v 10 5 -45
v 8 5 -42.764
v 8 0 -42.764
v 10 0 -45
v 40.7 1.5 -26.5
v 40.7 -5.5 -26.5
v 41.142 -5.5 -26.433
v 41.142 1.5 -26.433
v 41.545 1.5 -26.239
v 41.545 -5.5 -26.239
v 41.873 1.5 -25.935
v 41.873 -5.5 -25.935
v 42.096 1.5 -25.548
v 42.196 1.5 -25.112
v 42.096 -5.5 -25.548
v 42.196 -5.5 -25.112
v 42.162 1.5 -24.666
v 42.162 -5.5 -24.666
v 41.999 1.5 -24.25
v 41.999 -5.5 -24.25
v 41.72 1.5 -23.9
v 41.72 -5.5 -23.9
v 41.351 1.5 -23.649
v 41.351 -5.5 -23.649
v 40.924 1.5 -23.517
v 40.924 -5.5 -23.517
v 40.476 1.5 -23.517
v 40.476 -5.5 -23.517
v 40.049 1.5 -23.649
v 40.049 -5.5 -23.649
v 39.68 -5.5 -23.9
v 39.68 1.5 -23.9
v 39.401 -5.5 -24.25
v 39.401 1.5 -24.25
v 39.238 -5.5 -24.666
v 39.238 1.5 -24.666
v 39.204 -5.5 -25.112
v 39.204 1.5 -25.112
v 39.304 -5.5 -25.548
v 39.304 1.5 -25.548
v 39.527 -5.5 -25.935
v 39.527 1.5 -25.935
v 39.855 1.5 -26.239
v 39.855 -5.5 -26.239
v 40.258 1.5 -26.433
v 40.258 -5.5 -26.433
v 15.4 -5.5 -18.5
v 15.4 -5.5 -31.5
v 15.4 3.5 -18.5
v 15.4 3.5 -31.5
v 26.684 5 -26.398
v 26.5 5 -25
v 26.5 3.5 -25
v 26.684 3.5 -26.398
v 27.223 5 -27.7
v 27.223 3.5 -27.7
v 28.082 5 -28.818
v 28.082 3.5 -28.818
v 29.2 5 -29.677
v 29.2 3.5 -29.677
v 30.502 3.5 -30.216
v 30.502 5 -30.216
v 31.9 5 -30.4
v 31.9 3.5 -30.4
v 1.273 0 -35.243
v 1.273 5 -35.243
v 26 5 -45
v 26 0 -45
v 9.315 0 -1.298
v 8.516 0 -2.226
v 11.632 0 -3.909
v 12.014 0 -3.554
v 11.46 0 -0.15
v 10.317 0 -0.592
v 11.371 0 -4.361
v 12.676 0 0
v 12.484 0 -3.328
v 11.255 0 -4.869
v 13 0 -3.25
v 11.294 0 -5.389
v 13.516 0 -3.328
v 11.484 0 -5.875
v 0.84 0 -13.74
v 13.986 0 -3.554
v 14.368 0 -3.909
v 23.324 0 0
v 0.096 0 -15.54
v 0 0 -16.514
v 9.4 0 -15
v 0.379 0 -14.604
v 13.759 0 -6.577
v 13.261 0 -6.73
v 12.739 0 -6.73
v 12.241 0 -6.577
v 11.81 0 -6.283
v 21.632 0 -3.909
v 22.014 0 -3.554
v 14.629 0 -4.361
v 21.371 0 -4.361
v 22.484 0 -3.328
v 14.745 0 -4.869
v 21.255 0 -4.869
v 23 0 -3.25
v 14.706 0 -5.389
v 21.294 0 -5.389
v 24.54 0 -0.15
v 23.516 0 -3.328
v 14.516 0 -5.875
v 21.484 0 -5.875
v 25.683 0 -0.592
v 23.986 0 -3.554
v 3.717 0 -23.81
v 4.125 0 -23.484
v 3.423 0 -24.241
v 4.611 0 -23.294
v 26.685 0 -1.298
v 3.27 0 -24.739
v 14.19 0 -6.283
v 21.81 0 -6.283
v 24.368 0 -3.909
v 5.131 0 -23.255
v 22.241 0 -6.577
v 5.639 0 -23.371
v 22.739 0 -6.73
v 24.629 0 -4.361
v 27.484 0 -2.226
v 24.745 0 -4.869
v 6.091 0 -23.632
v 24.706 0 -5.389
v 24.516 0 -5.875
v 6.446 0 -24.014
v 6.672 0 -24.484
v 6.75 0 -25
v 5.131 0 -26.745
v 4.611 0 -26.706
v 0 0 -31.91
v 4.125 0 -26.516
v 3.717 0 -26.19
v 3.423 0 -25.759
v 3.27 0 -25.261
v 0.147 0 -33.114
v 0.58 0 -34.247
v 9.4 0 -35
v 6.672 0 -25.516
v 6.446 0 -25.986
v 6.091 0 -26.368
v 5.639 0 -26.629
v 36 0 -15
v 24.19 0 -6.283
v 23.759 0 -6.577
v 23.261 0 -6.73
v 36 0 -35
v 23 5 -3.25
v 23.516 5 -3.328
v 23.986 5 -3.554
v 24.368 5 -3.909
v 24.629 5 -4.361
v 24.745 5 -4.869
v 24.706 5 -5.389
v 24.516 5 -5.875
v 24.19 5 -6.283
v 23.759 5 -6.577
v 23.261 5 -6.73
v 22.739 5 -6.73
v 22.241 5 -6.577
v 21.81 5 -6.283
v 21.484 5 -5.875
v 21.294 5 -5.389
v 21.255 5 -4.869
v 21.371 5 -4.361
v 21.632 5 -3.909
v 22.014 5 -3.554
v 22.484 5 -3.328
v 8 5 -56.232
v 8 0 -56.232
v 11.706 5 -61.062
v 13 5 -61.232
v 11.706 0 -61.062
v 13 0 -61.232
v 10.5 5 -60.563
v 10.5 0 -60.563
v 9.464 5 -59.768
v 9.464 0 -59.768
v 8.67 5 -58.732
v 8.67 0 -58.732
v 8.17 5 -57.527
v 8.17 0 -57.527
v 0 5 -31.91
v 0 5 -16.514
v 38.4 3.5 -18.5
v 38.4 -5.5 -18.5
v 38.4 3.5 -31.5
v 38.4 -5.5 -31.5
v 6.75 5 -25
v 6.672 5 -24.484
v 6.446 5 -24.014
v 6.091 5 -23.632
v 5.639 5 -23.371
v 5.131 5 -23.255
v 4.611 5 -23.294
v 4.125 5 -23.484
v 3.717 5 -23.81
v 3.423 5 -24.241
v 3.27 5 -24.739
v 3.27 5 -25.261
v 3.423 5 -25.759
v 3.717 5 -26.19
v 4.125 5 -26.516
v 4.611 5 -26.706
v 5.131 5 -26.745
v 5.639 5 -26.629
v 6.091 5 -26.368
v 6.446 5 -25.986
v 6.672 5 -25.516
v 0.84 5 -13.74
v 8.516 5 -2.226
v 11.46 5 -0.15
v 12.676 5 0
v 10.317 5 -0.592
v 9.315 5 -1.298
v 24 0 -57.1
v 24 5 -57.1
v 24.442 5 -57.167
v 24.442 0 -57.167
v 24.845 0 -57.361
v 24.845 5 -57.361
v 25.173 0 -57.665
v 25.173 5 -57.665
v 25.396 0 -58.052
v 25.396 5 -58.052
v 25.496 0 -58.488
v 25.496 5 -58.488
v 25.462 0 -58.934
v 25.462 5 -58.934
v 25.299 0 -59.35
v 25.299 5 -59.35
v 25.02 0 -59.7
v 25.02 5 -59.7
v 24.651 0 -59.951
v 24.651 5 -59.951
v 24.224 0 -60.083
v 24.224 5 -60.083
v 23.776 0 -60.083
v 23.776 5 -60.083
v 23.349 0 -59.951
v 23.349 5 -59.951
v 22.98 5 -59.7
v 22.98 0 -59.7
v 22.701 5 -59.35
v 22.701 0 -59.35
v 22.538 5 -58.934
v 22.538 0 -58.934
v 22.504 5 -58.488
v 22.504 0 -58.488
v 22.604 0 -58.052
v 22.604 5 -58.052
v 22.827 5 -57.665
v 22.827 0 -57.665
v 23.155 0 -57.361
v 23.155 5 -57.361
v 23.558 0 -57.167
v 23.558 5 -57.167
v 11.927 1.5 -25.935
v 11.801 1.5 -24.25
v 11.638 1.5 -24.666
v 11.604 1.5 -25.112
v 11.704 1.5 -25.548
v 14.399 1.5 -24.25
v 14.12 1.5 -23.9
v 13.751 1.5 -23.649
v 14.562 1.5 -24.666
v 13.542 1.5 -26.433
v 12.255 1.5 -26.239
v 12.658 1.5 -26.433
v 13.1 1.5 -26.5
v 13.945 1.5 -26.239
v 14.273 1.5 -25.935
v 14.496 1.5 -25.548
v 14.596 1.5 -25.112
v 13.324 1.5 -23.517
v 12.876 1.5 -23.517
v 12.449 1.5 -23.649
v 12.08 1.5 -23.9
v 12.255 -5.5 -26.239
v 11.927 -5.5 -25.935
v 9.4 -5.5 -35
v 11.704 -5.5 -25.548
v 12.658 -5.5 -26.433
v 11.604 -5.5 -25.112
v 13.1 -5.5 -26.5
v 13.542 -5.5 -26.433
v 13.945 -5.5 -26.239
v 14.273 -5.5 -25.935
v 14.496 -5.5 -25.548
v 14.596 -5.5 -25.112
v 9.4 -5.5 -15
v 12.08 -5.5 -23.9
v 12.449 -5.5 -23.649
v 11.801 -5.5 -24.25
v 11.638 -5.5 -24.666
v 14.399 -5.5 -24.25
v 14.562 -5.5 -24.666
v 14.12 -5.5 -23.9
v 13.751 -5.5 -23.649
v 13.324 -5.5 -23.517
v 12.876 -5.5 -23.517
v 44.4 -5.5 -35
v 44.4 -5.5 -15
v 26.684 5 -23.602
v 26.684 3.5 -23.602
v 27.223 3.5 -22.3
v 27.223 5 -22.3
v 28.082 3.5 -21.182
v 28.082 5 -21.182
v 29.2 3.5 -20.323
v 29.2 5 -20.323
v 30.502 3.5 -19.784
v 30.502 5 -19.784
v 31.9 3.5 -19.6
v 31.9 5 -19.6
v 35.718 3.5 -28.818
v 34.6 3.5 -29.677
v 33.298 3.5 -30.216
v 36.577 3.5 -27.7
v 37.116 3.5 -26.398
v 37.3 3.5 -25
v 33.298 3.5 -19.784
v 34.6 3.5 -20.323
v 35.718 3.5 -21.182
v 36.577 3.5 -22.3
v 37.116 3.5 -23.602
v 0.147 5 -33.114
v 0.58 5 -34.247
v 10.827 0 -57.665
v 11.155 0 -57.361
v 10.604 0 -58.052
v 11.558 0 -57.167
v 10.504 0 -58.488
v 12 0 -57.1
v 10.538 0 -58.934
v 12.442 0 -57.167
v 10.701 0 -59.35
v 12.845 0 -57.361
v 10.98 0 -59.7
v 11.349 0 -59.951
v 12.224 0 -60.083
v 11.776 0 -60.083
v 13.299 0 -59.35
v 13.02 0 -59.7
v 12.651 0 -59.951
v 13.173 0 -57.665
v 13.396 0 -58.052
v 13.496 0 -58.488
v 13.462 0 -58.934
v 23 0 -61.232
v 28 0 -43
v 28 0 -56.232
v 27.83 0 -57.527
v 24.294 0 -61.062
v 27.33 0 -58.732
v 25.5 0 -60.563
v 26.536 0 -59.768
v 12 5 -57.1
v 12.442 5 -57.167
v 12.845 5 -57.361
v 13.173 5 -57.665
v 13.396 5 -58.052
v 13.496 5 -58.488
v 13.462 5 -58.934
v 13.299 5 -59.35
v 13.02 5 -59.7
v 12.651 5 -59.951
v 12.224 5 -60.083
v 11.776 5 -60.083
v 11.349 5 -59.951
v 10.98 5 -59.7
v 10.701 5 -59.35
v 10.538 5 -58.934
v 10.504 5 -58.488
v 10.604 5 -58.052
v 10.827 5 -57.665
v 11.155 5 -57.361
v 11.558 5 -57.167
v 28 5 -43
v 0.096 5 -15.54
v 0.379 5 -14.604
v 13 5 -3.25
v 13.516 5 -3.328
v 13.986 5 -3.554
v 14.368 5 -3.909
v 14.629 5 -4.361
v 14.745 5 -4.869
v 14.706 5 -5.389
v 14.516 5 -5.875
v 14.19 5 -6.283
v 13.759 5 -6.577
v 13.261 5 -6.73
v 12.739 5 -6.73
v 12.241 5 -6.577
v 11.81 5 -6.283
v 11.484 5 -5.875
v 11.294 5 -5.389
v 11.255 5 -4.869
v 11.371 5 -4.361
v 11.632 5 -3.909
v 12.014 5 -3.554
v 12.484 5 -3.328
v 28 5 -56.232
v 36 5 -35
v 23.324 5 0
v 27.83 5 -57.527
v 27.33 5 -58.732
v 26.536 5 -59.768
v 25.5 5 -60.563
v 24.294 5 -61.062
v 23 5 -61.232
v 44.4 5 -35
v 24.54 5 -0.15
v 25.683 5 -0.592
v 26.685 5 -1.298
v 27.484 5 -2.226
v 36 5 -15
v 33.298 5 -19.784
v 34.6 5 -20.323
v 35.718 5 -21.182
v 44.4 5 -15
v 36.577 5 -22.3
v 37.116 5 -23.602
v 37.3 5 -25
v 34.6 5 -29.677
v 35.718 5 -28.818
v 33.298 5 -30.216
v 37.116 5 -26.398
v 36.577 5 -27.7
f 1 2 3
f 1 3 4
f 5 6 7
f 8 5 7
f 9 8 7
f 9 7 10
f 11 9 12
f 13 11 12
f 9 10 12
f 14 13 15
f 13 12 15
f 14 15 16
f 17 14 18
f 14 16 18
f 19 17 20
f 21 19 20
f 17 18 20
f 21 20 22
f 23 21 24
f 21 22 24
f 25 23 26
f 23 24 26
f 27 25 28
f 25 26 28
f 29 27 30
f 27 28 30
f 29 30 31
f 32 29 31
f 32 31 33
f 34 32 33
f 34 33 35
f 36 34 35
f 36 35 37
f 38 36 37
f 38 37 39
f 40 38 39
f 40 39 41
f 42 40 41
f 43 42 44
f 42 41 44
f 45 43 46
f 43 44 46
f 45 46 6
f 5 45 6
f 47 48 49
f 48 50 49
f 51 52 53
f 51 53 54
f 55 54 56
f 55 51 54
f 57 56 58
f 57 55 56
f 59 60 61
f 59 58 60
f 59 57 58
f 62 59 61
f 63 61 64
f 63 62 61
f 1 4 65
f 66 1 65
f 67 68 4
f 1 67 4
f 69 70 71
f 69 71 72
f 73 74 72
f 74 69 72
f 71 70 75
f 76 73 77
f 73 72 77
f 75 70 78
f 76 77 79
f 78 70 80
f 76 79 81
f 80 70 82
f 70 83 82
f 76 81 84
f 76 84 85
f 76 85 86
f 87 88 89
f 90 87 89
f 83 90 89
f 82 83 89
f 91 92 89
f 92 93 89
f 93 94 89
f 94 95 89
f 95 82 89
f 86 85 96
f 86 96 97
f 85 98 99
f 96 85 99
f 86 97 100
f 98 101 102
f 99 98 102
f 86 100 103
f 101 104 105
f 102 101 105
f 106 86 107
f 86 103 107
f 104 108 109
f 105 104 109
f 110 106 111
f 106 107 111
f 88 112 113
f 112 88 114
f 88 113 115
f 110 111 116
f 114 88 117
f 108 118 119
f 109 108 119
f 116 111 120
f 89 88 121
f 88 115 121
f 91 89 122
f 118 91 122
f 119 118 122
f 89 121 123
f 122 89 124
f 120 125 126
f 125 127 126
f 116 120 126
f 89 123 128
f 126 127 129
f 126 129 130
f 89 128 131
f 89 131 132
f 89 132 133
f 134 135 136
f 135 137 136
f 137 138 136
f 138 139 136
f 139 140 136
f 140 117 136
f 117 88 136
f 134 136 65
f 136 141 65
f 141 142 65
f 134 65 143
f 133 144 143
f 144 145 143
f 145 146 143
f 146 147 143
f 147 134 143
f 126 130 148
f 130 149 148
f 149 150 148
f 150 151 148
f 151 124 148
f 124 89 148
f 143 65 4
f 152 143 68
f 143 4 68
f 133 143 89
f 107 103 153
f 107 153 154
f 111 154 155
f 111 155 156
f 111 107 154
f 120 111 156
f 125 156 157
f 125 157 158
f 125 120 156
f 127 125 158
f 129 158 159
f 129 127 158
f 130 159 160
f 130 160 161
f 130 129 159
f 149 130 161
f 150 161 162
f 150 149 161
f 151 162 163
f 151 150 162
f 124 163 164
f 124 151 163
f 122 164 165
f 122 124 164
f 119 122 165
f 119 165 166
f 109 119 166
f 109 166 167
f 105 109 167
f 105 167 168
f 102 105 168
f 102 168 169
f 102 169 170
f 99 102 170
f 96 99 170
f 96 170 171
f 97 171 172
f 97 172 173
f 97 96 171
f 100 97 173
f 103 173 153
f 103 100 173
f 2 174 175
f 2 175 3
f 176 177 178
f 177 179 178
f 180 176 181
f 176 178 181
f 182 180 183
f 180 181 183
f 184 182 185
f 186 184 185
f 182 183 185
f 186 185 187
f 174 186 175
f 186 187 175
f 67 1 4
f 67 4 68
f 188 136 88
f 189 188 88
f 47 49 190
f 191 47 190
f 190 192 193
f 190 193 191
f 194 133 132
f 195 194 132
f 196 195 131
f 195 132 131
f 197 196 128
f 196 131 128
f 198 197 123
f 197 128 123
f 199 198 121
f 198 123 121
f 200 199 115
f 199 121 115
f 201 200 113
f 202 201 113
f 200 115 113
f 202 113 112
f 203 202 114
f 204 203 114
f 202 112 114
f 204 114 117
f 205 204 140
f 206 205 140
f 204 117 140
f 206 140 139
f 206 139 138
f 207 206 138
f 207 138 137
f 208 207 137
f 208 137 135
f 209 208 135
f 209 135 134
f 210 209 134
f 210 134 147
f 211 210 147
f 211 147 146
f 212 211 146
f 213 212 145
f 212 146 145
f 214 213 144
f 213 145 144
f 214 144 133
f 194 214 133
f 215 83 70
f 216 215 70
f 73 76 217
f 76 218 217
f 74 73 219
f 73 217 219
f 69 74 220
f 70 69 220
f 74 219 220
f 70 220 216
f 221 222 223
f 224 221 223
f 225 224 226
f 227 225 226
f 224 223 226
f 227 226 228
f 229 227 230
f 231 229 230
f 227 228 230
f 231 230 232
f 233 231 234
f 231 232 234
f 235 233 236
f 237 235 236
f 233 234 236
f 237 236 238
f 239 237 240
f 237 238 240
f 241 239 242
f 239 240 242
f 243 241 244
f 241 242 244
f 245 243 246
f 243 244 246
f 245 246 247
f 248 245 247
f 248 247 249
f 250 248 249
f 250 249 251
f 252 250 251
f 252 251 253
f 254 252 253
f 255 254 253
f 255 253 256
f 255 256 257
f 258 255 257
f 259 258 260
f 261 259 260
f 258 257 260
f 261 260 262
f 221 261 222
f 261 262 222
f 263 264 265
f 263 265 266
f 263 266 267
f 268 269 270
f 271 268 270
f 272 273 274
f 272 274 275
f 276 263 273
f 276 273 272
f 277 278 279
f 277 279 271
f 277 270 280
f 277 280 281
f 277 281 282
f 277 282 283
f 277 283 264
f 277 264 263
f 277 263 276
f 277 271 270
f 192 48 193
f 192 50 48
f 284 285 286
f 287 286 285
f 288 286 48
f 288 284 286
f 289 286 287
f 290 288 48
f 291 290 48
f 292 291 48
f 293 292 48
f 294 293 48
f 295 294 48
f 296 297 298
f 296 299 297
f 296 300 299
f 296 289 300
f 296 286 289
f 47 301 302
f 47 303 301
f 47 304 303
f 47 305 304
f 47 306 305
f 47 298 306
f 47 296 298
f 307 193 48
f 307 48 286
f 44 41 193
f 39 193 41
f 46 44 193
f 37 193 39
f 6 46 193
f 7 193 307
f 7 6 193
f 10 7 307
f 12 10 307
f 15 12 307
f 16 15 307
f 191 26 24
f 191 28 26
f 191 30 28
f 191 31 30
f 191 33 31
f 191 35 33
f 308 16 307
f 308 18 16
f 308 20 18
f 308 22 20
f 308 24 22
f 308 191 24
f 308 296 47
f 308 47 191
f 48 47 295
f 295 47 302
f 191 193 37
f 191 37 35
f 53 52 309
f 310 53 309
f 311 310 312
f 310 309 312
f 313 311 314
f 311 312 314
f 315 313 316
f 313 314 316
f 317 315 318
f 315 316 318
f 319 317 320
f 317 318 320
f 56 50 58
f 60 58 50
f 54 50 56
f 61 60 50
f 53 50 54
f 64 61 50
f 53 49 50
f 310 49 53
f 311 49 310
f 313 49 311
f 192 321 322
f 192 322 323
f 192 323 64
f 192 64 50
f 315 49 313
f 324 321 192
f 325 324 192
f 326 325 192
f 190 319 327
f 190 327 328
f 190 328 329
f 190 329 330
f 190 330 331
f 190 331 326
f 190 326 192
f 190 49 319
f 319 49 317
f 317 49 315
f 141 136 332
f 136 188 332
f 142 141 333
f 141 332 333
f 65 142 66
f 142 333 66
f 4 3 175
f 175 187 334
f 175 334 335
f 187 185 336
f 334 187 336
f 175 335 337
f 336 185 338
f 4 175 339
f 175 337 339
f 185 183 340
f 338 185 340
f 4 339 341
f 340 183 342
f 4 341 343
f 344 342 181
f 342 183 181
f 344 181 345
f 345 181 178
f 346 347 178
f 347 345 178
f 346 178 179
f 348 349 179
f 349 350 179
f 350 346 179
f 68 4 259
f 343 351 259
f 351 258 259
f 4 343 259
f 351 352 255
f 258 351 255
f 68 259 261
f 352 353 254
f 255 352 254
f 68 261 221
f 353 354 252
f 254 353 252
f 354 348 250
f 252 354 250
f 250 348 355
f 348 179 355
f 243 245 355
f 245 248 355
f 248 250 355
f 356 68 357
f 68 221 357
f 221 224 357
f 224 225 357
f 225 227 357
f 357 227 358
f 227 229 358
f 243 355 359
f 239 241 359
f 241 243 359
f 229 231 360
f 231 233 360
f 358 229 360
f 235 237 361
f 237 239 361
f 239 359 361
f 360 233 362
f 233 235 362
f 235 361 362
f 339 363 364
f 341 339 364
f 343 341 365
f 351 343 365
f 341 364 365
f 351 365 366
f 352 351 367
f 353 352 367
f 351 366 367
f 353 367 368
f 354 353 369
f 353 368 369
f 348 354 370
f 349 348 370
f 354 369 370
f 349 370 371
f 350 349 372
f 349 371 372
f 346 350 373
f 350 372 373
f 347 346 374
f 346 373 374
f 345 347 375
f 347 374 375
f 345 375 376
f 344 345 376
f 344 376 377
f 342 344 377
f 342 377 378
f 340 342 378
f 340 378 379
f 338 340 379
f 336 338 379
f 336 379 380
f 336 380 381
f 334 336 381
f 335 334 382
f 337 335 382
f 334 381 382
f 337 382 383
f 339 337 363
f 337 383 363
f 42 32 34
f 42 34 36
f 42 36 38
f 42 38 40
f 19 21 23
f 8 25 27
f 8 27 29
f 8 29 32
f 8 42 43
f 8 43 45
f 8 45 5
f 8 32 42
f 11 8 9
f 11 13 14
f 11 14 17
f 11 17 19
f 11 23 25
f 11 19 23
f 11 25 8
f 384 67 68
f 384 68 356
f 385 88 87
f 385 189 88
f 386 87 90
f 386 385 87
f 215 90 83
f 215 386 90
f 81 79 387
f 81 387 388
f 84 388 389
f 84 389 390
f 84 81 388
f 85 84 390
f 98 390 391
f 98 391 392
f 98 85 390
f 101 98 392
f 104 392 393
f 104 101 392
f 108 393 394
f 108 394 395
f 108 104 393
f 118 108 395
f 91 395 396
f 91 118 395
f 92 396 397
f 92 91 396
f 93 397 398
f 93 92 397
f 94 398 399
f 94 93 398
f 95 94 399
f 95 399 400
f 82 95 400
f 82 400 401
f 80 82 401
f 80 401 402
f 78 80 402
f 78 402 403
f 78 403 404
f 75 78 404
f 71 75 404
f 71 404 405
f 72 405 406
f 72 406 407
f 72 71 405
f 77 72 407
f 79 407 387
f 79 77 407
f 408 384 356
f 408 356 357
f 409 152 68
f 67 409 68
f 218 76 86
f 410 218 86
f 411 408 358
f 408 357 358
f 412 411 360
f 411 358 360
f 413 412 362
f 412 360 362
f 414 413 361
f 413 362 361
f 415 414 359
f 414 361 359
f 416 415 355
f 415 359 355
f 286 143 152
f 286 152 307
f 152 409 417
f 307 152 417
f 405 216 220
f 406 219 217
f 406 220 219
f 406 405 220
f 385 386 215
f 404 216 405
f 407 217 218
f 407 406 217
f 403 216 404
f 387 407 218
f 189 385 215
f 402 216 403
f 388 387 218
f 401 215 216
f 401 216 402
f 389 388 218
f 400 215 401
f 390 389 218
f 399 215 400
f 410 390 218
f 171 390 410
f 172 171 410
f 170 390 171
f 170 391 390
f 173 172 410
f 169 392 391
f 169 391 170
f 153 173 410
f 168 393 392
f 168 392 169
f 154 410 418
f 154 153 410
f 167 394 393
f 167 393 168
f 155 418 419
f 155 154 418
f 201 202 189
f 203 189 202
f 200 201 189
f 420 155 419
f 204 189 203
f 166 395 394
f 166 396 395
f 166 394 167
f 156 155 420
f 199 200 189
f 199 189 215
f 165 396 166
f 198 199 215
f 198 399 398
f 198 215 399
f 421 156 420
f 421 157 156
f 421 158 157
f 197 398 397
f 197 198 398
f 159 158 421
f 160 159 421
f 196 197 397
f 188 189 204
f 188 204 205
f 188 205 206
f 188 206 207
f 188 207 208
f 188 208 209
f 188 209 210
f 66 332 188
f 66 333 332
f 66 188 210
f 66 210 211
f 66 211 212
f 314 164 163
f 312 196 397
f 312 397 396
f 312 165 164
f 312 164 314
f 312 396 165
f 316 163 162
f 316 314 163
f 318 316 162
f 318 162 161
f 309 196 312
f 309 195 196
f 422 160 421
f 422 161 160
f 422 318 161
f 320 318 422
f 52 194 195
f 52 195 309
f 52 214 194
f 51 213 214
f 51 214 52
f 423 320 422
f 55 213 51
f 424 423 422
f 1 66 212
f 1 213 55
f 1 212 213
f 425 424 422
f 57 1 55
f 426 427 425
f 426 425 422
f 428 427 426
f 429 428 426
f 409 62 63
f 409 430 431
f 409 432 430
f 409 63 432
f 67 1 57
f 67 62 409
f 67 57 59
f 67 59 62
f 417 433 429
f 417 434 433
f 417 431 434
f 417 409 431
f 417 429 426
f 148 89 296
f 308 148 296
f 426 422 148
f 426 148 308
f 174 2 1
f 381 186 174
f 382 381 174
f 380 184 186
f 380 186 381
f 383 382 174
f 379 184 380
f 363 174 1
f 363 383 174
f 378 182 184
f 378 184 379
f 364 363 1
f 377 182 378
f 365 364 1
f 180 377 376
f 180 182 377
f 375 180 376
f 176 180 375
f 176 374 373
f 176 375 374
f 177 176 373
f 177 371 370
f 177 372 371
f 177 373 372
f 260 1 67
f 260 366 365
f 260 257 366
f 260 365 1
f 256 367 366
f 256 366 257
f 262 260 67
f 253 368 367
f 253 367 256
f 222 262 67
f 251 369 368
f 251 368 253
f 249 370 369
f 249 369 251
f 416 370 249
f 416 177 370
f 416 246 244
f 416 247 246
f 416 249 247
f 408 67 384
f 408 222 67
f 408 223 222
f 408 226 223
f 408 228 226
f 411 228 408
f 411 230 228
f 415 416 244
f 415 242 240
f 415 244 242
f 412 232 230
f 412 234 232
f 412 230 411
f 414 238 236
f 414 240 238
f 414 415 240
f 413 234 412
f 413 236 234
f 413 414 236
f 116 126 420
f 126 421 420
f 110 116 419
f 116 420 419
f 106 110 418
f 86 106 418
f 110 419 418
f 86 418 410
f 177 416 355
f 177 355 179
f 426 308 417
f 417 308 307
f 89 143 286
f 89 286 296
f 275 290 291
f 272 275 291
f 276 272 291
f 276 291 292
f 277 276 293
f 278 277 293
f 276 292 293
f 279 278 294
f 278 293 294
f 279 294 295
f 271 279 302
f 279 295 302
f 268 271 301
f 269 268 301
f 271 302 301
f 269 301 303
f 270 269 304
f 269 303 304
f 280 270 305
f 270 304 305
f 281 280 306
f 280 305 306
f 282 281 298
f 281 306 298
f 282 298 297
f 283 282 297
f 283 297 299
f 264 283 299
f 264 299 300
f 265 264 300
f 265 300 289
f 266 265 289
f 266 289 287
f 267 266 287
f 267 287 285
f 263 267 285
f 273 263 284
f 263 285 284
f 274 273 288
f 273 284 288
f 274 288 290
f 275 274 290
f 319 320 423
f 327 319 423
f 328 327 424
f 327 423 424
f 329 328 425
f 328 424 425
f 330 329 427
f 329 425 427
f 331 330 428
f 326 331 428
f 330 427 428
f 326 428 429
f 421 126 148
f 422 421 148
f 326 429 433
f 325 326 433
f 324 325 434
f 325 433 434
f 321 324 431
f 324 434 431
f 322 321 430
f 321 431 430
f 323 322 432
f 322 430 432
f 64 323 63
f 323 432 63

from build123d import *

# Parameters (mm, degrees)
SKETCH1_R           = 1.75
SKETCH1_W           = 7.2
SKETCH1_H           = 5.4
BOSS_EXTRUDE1_DEPTH = 5
FILLET5_RADIUS      = 10
FILLET5_LENGTH      = 5
FILLET2_R           = 5.4
FILLET6_R           = 5.4
SKETCH3_W           = 35
SKETCH3_H           = 20
SKETCH3_W_2         = 23
SKETCH3_H_2         = 13
BOSS_EXTRUDE4_DEPTH = 5.5
SKETCH5_W           = 23
SKETCH5_H           = 13
CUT_EXTRUDE1_DEPTH  = 3.5
CUT_EXTRUDE2_DEPTH  = 76.201396264
SKETCH9_R           = 1.5
CUT_EXTRUDE4_DEPTH  = 7
ESQUISSE4_R         = 1.5
BOSS_EXTRU_1_DEPTH  = 5
CONG_1_R            = 5
CONG_2_R            = 5


with BuildPart() as part:
    # Sketch1 → Boss-Extrude1 (new body)
    # profile 1 of 4: a face of its own
    with BuildSketch(Plane(origin=(0, 0, 0), x_dir=(1, 0, 0), z_dir=(0, 1, 0))):
        with BuildLine():
            Line((3.25, 25), (0, 25))
            Line((0, 25), (0, 15))
            Line((0, 15), (10, 0))
            Line((10, 0), (26, 0))
            Line((26, 0), (36, 15))
            Line((36, 15), (60, 15))
            Line((60, 15), (60, 25))
            Line((60, 25), (44.5, 25))
            Line((44.5, 25), (44.5, 19.6))
            Line((44.5, 19.6), (37.3, 19.6))
            Line((37.3, 19.6), (26.5, 19.6))
            Line((26.5, 19.6), (26.5, 25))
            Line((26.5, 25), (6.75, 25))
            ThreePointArc((6.75, 25), (5, 23.25), (3.25, 25))
        make_face()
        with Locations(Location((13, 5, 0), (0, 0, 270))):
            Circle(SKETCH1_R, mode=Mode.SUBTRACT)
        with Locations(Location((23, 5, 0), (0, 0, 270))):
            Circle(SKETCH1_R, mode=Mode.SUBTRACT)
    # profile 2 of 4: a face of its own
    with BuildSketch(Plane(origin=(0, 0, 0), x_dir=(1, 0, 0), z_dir=(0, 1, 0))):
        with BuildLine():
            Line((10, 45), (0, 33.819660113))
            Line((0, 33.819660113), (0, 25))
            Line((0, 25), (3.25, 25))
            ThreePointArc((3.25, 25), (5, 26.75), (6.75, 25))
            Line((6.75, 25), (26.5, 25))
            Line((26.5, 25), (26.5, 30.4))
            Line((26.5, 30.4), (37.3, 30.4))
            Line((37.3, 30.4), (44.5, 30.4))
            Line((44.5, 30.4), (44.5, 25))
            Line((44.5, 25), (60, 25))
            Line((60, 25), (60, 35))
            Line((60, 35), (36, 35))
            Line((36, 35), (26, 45))
            Line((26, 45), (10, 45))
        make_face()
    # profile 3 of 4: a face of its own
    with BuildSketch(Plane(origin=(0, 0, 0), x_dir=(1, 0, 0), z_dir=(0, 1, 0))):
        with Locations((40.9, 27.7)):
            Rectangle(SKETCH1_W, SKETCH1_H)
    # profile 4 of 4: a face of its own
    with BuildSketch(Plane(origin=(0, 0, 0), x_dir=(1, 0, 0), z_dir=(0, 1, 0))):
        with Locations((40.9, 22.3)):
            Rectangle(SKETCH1_W, SKETCH1_H)
    extrude(amount=BOSS_EXTRUDE1_DEPTH)

    # Fillet5: full round fillet: the end face becomes a half cylinder, R = half its width
    fillet5_face = Plane((60, 2.5, -25), x_dir=(0, -1, 0), z_dir=(1, 0, 0))  # on the end face: x along it, z out of the body
    fillet5_slab = fillet5_face.offset(-FILLET5_RADIUS / 2) * Box(FILLET5_LENGTH, 2 * FILLET5_RADIUS, FILLET5_RADIUS, mode=Mode.PRIVATE)  # the body's end, R deep
    fillet5_round = Plane((50, 2.5, -25), x_dir=(1, 0, 0), z_dir=(0, -1, 0)) * Cylinder(FILLET5_RADIUS, FILLET5_LENGTH, mode=Mode.PRIVATE)  # its axis R under the face
    add(fillet5_slab - fillet5_round, mode=Mode.SUBTRACT)

    # Fillet2
    fillet2_edges = [part.edges().sort_by_distance(p)[0] for p in [
        (26.5, 2.5, -30.4),
        (26.5, 2.5, -19.6),
    ]]
    fillet(fillet2_edges, radius=FILLET2_R - 0.0001)  # a hair under: the kernel refuses the full size

    # Fillet6
    fillet6_edges = [part.edges().sort_by_distance(p)[0] for p in [
        (37.3, 2.5, -19.6),
        (37.3, 2.5, -30.4),
    ]]
    fillet(fillet6_edges, radius=FILLET6_R - 0.0001)  # a hair under: the kernel refuses the full size

    # Sketch3 → Boss-Extrude4 (add)
    with BuildSketch(Plane.XZ):
        with Locations((26.9, -25)):
            Rectangle(SKETCH3_W, SKETCH3_H)
        with Locations((26.9, -25)):
            Rectangle(SKETCH3_W_2, SKETCH3_H_2, mode=Mode.SUBTRACT)
    extrude(amount=BOSS_EXTRUDE4_DEPTH)

    # Sketch5 → Cut-Extrude1 (cut)
    with BuildSketch(Plane.XZ):
        with Locations((26.9, -25)):
            Rectangle(SKETCH5_W, SKETCH5_H)
    extrude(amount=-CUT_EXTRUDE1_DEPTH, mode=Mode.SUBTRACT)

    # Sketch6 → Cut-Extrude2 (cut, through all)
    with BuildSketch(Plane.XZ):
        with BuildLine():
            Line((44.4, -15), (44.4, -35))
            Line((44.4, -35), (50, -35))
            ThreePointArc((50, -35), (60, -25), (50, -15))
            Line((50, -15), (44.4, -15))
        make_face()
    extrude(amount=-CUT_EXTRUDE2_DEPTH, mode=Mode.SUBTRACT)

    # Sketch9 → Cut-Extrude4 (cut)
    with BuildSketch(Plane.XZ.offset(5.5)):
        with Locations(Location((13.1, -25, 0), (0, 0, 270))):
            Circle(SKETCH9_R)
        with Locations(Location((40.7, -25, 0), (0, 0, 270))):
            Circle(SKETCH9_R)
    extrude(amount=-CUT_EXTRUDE4_DEPTH, mode=Mode.SUBTRACT)

    # Congé2
    cong_2_edges = [part.edges().sort_by_distance(p)[0] for p in [
        (26, 2.5, 0),
        (10, 2.5, 0),
        (0, 2.5, -15),
        (0, 2.5, -33.819660113),
    ]]
    fillet(cong_2_edges, radius=CONG_2_R)


with BuildPart() as body_2:
    # Esquisse4 → Boss.-Extru.1 (new body)
    with BuildSketch(Plane(origin=(0, 5, 0), x_dir=(1, 0, 0), z_dir=(0, 1, 0))):
        Polygon((26, 45), (28, 43), (28, 61.232493039), (8, 61.232493039), (8, 42.763932023), (10, 45), align=None)
        with Locations(Location((12, 58.6, 0), (0, 0, 270))):
            Circle(ESQUISSE4_R, mode=Mode.SUBTRACT)
        with Locations(Location((24, 58.6, 0), (0, 0, 270))):
            Circle(ESQUISSE4_R, mode=Mode.SUBTRACT)
    extrude(amount=-BOSS_EXTRU_1_DEPTH)

    # Congé1
    cong_1_edges = [body_2.edges().sort_by_distance(p)[0] for p in [
        (28, 2.5, -61.232493039),
        (8, 2.5, -61.232493039),
    ]]
    fillet(cong_1_edges, radius=CONG_1_R)


solid = Compound([part.part, body_2.part])
